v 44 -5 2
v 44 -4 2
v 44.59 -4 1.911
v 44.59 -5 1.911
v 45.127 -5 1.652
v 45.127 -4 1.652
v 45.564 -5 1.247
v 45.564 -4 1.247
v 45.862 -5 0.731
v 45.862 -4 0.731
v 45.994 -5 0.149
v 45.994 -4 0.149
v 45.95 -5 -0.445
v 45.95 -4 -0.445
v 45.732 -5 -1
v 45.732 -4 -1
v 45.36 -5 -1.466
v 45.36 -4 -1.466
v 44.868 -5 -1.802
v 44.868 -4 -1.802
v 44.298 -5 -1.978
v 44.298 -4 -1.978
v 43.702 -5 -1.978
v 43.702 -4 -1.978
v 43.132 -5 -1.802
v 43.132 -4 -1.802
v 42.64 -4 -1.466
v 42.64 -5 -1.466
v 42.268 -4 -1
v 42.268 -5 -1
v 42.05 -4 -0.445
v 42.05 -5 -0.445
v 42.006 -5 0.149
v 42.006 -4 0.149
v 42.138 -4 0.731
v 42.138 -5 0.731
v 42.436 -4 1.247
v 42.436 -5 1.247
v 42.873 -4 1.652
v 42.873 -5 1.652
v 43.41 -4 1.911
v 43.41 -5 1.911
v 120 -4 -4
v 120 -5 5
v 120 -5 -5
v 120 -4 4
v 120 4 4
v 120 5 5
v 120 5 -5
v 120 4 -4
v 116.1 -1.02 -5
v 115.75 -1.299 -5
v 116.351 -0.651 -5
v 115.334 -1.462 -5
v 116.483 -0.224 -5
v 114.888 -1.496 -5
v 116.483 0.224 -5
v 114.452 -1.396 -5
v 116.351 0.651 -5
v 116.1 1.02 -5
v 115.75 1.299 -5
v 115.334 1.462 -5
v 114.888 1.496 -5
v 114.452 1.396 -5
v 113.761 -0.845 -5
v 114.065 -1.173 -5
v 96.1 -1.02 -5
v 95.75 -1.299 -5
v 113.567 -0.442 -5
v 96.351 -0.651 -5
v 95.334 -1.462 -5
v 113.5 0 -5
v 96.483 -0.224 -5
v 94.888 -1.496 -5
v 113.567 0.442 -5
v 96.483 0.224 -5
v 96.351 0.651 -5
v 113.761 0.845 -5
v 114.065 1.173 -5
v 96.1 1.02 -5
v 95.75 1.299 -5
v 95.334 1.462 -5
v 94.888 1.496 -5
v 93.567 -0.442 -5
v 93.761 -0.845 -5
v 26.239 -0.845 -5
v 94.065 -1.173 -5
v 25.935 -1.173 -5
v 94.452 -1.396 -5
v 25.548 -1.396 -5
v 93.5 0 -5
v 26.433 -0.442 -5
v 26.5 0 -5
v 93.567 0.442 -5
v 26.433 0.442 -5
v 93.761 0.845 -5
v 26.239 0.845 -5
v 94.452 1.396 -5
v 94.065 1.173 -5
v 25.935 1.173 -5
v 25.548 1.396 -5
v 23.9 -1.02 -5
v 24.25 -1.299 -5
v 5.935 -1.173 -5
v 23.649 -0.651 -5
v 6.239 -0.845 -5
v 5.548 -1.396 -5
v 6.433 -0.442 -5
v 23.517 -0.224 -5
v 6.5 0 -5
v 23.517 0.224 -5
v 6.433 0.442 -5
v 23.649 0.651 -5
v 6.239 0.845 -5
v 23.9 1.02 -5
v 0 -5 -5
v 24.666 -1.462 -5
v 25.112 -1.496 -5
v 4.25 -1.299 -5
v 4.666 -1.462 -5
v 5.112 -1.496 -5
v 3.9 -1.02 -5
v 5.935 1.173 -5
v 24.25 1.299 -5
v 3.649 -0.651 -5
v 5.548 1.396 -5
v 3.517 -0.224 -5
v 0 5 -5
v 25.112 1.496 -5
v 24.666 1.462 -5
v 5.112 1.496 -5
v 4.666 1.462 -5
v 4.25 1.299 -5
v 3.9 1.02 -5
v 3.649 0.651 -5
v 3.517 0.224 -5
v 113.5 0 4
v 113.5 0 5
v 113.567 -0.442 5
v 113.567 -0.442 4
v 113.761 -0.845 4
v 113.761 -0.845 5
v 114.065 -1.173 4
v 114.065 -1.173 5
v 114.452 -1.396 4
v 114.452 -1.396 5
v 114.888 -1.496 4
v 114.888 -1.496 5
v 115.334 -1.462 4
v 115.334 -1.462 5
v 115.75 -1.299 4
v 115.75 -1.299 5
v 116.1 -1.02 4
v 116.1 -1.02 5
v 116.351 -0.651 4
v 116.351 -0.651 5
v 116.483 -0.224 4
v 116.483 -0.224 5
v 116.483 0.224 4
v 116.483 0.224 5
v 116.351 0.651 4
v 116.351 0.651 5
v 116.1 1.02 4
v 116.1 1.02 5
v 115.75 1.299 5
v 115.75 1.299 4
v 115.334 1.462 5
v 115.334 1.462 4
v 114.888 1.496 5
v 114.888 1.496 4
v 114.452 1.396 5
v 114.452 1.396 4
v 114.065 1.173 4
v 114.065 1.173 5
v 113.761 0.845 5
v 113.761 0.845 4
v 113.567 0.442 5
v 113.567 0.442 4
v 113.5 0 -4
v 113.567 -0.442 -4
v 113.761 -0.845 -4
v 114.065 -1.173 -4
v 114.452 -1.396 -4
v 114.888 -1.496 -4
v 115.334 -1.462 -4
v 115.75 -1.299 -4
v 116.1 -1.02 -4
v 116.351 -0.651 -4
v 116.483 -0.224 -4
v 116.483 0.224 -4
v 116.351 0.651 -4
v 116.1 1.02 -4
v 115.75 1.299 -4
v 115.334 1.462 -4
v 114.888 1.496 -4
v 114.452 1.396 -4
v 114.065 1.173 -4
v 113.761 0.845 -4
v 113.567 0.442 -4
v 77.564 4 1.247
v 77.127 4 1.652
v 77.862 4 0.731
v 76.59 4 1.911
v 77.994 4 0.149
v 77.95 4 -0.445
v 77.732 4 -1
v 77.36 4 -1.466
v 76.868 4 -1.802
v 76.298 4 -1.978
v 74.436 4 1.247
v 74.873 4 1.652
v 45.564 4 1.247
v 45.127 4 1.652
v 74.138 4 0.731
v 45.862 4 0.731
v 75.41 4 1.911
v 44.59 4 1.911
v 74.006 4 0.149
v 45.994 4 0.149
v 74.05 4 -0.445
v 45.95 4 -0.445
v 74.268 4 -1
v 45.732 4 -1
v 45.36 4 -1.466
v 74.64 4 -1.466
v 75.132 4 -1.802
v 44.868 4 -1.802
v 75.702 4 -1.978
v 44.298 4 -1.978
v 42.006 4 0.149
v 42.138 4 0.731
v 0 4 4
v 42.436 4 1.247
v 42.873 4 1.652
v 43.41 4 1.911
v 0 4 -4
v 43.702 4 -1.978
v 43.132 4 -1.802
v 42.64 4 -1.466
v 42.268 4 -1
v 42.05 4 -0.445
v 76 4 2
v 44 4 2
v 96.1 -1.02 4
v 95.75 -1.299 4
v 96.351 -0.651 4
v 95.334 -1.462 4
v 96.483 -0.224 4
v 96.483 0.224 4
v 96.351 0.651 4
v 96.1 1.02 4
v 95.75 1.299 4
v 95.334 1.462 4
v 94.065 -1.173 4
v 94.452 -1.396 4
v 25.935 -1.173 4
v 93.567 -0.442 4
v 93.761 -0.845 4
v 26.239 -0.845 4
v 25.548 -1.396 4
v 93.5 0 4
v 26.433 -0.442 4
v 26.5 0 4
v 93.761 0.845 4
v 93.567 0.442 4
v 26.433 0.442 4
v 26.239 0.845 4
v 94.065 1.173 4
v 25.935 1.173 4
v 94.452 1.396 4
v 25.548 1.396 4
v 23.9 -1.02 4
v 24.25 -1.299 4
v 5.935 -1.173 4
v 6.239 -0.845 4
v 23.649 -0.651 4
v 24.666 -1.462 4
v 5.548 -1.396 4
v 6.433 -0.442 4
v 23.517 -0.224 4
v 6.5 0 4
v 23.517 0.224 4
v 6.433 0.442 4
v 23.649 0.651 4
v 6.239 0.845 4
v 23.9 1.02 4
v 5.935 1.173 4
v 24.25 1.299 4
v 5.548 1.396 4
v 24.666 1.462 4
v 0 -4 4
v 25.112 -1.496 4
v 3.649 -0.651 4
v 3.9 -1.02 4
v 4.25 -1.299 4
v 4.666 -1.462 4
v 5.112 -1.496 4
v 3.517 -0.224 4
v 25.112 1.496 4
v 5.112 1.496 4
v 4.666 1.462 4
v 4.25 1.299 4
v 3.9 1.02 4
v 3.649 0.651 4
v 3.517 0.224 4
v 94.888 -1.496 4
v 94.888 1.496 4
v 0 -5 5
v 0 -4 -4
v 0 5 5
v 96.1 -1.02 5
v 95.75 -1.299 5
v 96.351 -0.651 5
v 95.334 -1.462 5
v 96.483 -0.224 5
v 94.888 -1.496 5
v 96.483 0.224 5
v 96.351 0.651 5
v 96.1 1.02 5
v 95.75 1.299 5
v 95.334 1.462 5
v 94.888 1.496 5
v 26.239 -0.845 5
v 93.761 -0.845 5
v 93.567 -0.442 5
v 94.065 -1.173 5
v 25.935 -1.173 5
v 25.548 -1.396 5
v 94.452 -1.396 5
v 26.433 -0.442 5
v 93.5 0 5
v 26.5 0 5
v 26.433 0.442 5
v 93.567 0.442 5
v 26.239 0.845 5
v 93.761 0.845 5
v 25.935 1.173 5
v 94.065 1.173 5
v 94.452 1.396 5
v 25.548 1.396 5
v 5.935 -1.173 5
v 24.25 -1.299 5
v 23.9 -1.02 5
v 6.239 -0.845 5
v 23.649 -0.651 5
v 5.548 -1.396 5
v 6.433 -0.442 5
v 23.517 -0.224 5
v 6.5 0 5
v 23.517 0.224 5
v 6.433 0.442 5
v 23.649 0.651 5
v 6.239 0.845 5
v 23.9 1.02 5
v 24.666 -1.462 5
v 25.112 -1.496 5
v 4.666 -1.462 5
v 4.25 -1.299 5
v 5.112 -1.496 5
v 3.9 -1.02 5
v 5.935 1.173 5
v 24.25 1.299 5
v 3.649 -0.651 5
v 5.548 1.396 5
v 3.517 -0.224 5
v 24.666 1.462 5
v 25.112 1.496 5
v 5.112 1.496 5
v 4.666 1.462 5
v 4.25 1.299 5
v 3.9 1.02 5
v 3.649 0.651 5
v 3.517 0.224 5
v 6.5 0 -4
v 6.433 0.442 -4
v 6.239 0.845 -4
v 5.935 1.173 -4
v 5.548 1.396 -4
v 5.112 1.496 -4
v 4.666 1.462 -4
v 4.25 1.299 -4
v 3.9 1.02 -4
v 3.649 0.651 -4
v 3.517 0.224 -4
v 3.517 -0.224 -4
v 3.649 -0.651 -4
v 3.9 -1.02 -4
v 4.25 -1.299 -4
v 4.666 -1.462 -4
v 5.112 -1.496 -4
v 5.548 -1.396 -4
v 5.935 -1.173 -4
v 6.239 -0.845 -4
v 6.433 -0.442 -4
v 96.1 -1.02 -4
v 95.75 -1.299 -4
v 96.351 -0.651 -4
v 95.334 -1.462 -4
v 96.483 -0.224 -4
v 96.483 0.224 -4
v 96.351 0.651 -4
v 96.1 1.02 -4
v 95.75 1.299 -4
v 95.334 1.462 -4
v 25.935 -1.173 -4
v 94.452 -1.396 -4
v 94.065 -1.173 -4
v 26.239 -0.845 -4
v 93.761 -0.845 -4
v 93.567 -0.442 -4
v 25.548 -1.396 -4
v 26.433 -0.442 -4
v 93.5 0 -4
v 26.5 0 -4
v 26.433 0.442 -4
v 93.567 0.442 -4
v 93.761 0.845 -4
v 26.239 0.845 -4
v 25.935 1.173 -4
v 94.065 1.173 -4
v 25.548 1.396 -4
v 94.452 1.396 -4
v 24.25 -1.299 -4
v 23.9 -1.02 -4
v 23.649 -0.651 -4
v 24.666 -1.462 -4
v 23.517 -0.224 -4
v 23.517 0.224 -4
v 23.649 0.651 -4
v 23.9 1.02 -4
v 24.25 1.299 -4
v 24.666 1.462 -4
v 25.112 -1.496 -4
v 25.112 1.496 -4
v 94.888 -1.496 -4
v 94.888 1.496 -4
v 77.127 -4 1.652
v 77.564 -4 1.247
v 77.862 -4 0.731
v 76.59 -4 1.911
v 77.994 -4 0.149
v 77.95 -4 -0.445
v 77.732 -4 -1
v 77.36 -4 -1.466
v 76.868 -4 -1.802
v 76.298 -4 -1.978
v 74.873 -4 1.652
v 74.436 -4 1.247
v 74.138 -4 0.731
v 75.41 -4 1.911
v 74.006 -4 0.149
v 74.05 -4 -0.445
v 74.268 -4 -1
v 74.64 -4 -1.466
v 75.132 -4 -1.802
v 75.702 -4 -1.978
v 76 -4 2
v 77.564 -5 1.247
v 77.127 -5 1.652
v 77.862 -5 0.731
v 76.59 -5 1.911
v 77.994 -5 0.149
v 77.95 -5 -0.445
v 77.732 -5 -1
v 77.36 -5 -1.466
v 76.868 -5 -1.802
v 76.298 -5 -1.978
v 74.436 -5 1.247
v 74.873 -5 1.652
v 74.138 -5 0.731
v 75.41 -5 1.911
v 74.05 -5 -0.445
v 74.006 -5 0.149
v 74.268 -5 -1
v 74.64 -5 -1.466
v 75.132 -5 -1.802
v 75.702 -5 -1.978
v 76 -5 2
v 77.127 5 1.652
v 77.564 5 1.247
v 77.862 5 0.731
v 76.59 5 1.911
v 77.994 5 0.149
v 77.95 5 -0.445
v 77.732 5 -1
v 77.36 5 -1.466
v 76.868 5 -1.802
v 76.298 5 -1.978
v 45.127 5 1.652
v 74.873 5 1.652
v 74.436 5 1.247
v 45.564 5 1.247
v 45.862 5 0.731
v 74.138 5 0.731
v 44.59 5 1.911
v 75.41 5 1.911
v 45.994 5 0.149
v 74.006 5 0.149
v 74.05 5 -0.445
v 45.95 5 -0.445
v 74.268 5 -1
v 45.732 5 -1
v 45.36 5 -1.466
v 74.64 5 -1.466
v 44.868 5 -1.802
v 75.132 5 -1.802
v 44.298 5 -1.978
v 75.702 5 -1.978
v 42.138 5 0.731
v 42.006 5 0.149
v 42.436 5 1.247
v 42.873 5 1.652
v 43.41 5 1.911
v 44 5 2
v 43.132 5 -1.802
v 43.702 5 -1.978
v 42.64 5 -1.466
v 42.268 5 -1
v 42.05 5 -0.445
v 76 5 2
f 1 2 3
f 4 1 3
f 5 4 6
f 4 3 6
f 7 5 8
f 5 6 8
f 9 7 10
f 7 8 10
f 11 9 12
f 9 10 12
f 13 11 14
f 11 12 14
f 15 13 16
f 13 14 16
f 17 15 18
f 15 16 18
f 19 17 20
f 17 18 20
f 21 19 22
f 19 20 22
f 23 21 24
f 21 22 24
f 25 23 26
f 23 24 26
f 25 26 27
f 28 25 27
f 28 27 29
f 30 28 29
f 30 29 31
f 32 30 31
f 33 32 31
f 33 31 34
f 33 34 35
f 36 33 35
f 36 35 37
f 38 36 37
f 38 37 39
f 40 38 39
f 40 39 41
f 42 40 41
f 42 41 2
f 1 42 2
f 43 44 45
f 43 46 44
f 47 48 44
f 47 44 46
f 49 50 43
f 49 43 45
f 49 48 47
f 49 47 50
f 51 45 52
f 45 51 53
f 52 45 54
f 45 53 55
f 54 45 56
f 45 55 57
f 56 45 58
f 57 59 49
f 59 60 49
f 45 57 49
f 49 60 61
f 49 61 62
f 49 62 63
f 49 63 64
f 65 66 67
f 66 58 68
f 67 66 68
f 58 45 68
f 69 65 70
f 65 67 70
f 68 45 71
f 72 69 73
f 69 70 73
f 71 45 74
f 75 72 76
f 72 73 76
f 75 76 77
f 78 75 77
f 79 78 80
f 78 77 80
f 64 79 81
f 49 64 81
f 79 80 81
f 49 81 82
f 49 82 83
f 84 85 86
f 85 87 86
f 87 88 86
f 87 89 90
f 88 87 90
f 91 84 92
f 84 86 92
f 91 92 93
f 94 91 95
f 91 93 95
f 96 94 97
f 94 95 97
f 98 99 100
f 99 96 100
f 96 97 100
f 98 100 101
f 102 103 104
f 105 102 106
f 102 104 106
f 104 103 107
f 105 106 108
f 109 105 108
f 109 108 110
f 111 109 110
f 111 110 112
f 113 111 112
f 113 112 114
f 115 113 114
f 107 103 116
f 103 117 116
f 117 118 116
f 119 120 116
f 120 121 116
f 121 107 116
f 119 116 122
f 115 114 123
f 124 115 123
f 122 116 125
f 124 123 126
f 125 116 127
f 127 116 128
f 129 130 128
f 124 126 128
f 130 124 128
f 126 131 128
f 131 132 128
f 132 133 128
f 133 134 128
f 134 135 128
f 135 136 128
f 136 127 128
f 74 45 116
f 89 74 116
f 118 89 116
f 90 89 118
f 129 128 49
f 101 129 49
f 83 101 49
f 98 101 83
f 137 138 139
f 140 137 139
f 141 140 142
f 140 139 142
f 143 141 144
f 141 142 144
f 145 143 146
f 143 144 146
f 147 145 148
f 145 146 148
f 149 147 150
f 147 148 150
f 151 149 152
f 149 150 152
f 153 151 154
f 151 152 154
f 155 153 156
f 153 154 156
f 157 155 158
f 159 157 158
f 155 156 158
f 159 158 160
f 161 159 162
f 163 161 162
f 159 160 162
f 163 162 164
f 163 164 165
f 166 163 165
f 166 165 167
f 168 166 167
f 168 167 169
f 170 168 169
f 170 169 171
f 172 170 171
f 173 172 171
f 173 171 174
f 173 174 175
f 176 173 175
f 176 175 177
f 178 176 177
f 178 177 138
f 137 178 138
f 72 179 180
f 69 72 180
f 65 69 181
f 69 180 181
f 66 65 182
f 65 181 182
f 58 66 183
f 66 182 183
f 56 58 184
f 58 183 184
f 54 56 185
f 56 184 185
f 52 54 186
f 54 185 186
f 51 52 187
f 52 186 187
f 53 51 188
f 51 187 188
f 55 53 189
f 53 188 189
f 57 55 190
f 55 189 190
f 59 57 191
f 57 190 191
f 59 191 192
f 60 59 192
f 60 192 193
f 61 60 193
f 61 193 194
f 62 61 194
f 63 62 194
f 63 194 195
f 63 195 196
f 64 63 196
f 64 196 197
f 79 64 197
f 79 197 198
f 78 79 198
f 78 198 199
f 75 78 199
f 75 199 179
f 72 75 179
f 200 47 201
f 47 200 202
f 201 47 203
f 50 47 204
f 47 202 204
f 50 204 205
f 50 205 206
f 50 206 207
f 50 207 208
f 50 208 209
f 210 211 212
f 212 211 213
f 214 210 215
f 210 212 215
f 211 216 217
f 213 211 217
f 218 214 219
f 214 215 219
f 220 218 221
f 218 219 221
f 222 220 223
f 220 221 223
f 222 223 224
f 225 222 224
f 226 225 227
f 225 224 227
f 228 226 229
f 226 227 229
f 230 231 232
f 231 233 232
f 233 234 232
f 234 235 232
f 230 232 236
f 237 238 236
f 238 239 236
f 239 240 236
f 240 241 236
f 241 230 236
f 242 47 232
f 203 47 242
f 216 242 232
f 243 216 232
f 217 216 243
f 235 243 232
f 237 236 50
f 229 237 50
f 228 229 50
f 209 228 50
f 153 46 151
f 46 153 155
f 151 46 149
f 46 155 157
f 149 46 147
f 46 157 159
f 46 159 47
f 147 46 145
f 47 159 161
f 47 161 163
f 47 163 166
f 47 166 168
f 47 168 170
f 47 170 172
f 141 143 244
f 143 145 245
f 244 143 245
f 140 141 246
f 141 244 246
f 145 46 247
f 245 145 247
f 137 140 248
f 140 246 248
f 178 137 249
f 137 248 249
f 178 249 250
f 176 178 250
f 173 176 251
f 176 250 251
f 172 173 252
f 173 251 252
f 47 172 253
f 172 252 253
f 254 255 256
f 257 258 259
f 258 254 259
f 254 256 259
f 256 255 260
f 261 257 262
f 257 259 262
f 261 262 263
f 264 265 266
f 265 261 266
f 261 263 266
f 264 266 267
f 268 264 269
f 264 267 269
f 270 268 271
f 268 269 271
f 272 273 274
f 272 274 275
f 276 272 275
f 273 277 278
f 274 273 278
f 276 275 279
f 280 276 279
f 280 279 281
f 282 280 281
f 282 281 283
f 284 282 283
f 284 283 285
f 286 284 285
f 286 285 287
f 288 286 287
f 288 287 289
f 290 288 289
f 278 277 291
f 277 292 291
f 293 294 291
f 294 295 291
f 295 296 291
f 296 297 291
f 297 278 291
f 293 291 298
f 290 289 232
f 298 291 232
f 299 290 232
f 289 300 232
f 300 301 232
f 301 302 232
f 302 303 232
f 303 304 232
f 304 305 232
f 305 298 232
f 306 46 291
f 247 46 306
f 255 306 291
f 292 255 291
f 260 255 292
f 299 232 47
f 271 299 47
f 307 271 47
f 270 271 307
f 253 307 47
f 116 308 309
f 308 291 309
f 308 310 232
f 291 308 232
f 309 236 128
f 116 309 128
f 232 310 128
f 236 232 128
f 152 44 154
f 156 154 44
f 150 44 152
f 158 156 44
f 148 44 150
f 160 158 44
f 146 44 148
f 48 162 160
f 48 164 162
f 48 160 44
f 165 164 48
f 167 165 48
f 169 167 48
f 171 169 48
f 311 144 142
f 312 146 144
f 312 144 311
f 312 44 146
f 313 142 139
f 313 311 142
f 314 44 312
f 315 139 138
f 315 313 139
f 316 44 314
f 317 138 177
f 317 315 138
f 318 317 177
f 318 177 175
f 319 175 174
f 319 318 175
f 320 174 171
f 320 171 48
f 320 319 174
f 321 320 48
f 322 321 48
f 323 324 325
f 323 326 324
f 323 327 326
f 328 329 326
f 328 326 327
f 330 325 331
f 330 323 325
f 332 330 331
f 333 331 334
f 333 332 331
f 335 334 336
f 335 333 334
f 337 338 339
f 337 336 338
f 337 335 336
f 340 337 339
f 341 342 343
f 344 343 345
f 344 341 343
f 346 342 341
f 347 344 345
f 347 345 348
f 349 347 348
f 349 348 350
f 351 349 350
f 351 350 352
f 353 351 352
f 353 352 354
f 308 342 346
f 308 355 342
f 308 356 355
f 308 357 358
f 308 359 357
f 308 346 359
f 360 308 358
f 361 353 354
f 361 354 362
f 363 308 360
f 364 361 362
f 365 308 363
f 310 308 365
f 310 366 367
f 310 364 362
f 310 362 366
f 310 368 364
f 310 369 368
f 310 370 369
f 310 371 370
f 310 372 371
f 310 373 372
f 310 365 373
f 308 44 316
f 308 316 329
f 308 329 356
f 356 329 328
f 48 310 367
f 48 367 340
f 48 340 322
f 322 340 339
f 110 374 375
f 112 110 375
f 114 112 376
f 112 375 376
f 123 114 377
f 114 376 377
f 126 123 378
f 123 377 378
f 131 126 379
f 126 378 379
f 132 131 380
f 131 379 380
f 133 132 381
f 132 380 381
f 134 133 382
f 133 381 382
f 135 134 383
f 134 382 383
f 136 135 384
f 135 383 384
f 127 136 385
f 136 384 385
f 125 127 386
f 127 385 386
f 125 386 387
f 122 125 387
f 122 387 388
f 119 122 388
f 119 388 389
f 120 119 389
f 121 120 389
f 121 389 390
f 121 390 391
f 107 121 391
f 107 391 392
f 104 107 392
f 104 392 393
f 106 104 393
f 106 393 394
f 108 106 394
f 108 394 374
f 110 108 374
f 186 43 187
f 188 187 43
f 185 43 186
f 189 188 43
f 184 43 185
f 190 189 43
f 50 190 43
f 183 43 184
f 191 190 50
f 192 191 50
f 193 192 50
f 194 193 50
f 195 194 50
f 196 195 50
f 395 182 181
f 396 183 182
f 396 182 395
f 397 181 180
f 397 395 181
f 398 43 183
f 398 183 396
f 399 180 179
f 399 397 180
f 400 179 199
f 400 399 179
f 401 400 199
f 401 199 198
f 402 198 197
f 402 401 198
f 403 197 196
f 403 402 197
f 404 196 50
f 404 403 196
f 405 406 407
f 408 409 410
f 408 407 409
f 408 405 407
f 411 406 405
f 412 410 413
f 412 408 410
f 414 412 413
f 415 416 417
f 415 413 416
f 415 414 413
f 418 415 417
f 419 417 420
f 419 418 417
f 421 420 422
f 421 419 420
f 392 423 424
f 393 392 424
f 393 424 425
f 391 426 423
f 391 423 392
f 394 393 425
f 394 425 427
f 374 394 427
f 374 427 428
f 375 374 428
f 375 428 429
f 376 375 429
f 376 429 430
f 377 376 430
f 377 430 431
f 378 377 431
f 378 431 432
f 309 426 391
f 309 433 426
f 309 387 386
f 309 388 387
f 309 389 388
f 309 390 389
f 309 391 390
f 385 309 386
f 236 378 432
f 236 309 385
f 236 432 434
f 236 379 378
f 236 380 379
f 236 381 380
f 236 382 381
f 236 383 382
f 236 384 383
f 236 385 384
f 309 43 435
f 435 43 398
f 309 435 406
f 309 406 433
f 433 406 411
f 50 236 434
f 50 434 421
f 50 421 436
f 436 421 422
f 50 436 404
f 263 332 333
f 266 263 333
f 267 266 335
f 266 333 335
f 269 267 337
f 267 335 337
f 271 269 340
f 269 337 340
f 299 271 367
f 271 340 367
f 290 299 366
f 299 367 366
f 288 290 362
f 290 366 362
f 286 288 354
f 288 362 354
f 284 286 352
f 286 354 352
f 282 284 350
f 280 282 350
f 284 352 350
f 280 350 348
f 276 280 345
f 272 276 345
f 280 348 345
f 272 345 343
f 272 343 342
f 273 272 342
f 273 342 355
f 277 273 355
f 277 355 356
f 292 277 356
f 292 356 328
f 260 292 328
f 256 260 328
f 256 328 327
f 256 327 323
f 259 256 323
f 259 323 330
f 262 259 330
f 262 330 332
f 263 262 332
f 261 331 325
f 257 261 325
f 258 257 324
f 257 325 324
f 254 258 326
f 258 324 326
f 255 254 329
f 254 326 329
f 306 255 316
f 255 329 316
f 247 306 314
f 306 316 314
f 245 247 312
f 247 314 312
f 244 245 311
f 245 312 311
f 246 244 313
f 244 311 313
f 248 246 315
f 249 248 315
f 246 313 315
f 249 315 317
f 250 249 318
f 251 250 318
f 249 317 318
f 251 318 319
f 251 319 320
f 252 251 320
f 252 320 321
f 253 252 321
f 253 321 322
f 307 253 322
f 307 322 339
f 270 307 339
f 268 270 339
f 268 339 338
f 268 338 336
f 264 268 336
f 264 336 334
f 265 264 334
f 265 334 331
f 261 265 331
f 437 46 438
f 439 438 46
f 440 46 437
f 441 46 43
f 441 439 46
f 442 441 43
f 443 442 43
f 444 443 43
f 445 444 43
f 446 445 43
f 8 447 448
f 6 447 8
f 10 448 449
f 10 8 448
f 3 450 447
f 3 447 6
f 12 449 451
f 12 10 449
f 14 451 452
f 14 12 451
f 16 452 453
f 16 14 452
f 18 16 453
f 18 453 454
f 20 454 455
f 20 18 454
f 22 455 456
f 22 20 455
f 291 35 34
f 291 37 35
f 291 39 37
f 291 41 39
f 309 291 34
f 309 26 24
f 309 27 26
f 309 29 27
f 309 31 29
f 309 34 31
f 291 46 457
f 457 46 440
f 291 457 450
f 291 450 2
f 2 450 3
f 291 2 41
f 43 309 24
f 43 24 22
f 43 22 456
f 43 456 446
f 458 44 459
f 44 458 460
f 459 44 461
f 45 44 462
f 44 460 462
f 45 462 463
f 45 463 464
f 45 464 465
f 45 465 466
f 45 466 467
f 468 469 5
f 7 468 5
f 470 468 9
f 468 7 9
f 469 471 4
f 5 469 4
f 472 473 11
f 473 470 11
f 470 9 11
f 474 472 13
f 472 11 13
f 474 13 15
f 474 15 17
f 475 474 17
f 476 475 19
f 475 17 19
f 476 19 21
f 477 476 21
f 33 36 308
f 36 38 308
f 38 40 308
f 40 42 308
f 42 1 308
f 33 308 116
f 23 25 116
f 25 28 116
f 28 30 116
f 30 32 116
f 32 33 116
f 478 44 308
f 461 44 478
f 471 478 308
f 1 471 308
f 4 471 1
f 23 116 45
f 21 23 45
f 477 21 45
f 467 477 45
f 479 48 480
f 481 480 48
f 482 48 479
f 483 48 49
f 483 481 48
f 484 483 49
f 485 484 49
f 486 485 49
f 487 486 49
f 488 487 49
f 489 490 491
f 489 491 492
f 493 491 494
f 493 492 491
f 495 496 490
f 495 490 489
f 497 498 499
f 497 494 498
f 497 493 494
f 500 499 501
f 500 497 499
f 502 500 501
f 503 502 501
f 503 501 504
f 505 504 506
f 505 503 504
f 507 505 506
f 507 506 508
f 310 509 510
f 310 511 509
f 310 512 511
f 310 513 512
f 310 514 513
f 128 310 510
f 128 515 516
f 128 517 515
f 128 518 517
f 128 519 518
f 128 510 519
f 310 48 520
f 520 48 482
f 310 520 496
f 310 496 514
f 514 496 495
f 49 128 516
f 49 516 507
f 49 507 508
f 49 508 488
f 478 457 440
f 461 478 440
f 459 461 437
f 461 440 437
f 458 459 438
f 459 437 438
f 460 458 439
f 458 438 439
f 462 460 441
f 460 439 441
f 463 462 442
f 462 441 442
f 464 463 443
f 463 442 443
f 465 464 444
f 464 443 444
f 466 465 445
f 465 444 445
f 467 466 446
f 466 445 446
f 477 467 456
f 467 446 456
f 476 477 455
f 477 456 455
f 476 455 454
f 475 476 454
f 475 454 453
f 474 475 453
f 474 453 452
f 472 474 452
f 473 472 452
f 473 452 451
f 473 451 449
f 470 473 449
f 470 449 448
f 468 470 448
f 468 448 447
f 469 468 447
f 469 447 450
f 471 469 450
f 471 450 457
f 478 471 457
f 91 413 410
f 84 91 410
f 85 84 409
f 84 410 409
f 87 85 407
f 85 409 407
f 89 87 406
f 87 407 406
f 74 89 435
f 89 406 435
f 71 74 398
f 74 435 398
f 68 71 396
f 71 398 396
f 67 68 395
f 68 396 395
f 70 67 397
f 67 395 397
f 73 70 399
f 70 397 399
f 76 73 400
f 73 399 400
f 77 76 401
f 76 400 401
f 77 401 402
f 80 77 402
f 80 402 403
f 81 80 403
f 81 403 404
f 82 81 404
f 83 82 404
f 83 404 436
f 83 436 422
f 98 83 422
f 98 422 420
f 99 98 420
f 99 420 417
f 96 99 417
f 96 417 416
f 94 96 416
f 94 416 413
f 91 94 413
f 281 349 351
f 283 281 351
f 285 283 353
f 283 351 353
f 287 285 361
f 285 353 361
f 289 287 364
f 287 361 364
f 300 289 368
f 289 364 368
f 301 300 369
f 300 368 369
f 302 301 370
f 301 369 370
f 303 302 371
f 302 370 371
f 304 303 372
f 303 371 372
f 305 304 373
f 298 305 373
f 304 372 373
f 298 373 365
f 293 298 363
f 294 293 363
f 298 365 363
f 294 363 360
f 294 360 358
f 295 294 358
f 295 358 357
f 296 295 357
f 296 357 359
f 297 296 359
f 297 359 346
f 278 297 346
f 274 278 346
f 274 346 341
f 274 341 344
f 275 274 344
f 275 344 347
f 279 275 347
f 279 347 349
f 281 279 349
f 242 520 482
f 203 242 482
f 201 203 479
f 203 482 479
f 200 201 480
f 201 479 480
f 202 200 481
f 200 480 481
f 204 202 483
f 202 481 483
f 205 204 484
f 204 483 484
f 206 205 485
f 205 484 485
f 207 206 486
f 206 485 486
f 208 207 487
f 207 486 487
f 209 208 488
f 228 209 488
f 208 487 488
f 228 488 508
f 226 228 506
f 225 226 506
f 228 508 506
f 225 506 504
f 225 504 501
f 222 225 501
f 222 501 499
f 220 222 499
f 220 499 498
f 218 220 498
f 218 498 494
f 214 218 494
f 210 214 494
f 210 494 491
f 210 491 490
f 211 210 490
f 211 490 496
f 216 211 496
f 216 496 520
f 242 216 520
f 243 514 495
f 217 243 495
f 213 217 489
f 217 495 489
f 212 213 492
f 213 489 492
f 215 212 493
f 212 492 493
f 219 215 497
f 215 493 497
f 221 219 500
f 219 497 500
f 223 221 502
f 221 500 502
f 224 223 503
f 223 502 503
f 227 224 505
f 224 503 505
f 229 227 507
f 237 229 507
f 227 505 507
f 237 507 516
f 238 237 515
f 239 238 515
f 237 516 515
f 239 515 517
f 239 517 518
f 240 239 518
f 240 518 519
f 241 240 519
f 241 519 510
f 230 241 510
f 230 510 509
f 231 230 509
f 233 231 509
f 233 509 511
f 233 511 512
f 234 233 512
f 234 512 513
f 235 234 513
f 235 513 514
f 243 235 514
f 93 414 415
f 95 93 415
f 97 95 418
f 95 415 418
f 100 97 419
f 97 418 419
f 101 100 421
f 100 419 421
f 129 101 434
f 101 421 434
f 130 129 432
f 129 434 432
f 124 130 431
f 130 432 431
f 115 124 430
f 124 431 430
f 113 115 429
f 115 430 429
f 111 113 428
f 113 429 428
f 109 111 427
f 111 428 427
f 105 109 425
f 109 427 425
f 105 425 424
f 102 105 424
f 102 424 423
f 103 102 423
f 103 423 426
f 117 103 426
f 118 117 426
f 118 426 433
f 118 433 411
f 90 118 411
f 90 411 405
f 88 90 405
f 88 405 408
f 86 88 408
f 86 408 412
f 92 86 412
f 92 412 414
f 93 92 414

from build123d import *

# Parameters (mm, degrees)
SKETCH_1_W          = 10
SKETCH_1_H          = 10
SKETCH_1_W_2        = 8
SKETCH_1_H_2        = 8
EXTRUDE_1_DEPTH     = 120
SKETCH_2_R          = 2
CUT_EXTRUDE_1_DEPTH = 121.519707932
SKETCH_3_R          = 1.5
CUT_EXTRUDE_2_DEPTH = 121.519707932


with BuildPart() as part:
    # ｽｹｯﾁ1 → 押し出し-薄板1 (new body)
    with BuildSketch(Plane(origin=(0, 0, 0), x_dir=(0, 0, -1), z_dir=(1, 0, 0))):
        Rectangle(SKETCH_1_W, SKETCH_1_H)
        Rectangle(SKETCH_1_W_2, SKETCH_1_H_2, mode=Mode.SUBTRACT)
    extrude(amount=EXTRUDE_1_DEPTH)

    # ｽｹｯﾁ2 → ｶｯﾄ - 押し出し1 (cut, through all)
    with BuildSketch(Plane(origin=(0, 5, 0), x_dir=(1, 0, 0), z_dir=(0, 1, 0))):
        with Locations(Location((44, 0, 0), (0, 0, 270))):
            Circle(SKETCH_2_R)
        with Locations(Location((76, 0, 0), (0, 0, 270))):
            Circle(SKETCH_2_R)
    extrude(amount=-CUT_EXTRUDE_1_DEPTH, mode=Mode.SUBTRACT)

    # ｽｹｯﾁ3 → ｶｯﾄ - 押し出し2 (cut, through all)
    with BuildSketch(Plane.XY.offset(5)):
        with Locations((5, 0)):
            Circle(SKETCH_3_R)
        with Locations(Location((115, 0, 0), (0, 0, 180))):
            Circle(SKETCH_3_R)
        with Locations((25, 0)):
            Circle(SKETCH_3_R)
        with Locations(Location((95, 0, 0), (0, 0, 180))):
            Circle(SKETCH_3_R)
    extrude(amount=-CUT_EXTRUDE_2_DEPTH, mode=Mode.SUBTRACT)


solid = part.part
